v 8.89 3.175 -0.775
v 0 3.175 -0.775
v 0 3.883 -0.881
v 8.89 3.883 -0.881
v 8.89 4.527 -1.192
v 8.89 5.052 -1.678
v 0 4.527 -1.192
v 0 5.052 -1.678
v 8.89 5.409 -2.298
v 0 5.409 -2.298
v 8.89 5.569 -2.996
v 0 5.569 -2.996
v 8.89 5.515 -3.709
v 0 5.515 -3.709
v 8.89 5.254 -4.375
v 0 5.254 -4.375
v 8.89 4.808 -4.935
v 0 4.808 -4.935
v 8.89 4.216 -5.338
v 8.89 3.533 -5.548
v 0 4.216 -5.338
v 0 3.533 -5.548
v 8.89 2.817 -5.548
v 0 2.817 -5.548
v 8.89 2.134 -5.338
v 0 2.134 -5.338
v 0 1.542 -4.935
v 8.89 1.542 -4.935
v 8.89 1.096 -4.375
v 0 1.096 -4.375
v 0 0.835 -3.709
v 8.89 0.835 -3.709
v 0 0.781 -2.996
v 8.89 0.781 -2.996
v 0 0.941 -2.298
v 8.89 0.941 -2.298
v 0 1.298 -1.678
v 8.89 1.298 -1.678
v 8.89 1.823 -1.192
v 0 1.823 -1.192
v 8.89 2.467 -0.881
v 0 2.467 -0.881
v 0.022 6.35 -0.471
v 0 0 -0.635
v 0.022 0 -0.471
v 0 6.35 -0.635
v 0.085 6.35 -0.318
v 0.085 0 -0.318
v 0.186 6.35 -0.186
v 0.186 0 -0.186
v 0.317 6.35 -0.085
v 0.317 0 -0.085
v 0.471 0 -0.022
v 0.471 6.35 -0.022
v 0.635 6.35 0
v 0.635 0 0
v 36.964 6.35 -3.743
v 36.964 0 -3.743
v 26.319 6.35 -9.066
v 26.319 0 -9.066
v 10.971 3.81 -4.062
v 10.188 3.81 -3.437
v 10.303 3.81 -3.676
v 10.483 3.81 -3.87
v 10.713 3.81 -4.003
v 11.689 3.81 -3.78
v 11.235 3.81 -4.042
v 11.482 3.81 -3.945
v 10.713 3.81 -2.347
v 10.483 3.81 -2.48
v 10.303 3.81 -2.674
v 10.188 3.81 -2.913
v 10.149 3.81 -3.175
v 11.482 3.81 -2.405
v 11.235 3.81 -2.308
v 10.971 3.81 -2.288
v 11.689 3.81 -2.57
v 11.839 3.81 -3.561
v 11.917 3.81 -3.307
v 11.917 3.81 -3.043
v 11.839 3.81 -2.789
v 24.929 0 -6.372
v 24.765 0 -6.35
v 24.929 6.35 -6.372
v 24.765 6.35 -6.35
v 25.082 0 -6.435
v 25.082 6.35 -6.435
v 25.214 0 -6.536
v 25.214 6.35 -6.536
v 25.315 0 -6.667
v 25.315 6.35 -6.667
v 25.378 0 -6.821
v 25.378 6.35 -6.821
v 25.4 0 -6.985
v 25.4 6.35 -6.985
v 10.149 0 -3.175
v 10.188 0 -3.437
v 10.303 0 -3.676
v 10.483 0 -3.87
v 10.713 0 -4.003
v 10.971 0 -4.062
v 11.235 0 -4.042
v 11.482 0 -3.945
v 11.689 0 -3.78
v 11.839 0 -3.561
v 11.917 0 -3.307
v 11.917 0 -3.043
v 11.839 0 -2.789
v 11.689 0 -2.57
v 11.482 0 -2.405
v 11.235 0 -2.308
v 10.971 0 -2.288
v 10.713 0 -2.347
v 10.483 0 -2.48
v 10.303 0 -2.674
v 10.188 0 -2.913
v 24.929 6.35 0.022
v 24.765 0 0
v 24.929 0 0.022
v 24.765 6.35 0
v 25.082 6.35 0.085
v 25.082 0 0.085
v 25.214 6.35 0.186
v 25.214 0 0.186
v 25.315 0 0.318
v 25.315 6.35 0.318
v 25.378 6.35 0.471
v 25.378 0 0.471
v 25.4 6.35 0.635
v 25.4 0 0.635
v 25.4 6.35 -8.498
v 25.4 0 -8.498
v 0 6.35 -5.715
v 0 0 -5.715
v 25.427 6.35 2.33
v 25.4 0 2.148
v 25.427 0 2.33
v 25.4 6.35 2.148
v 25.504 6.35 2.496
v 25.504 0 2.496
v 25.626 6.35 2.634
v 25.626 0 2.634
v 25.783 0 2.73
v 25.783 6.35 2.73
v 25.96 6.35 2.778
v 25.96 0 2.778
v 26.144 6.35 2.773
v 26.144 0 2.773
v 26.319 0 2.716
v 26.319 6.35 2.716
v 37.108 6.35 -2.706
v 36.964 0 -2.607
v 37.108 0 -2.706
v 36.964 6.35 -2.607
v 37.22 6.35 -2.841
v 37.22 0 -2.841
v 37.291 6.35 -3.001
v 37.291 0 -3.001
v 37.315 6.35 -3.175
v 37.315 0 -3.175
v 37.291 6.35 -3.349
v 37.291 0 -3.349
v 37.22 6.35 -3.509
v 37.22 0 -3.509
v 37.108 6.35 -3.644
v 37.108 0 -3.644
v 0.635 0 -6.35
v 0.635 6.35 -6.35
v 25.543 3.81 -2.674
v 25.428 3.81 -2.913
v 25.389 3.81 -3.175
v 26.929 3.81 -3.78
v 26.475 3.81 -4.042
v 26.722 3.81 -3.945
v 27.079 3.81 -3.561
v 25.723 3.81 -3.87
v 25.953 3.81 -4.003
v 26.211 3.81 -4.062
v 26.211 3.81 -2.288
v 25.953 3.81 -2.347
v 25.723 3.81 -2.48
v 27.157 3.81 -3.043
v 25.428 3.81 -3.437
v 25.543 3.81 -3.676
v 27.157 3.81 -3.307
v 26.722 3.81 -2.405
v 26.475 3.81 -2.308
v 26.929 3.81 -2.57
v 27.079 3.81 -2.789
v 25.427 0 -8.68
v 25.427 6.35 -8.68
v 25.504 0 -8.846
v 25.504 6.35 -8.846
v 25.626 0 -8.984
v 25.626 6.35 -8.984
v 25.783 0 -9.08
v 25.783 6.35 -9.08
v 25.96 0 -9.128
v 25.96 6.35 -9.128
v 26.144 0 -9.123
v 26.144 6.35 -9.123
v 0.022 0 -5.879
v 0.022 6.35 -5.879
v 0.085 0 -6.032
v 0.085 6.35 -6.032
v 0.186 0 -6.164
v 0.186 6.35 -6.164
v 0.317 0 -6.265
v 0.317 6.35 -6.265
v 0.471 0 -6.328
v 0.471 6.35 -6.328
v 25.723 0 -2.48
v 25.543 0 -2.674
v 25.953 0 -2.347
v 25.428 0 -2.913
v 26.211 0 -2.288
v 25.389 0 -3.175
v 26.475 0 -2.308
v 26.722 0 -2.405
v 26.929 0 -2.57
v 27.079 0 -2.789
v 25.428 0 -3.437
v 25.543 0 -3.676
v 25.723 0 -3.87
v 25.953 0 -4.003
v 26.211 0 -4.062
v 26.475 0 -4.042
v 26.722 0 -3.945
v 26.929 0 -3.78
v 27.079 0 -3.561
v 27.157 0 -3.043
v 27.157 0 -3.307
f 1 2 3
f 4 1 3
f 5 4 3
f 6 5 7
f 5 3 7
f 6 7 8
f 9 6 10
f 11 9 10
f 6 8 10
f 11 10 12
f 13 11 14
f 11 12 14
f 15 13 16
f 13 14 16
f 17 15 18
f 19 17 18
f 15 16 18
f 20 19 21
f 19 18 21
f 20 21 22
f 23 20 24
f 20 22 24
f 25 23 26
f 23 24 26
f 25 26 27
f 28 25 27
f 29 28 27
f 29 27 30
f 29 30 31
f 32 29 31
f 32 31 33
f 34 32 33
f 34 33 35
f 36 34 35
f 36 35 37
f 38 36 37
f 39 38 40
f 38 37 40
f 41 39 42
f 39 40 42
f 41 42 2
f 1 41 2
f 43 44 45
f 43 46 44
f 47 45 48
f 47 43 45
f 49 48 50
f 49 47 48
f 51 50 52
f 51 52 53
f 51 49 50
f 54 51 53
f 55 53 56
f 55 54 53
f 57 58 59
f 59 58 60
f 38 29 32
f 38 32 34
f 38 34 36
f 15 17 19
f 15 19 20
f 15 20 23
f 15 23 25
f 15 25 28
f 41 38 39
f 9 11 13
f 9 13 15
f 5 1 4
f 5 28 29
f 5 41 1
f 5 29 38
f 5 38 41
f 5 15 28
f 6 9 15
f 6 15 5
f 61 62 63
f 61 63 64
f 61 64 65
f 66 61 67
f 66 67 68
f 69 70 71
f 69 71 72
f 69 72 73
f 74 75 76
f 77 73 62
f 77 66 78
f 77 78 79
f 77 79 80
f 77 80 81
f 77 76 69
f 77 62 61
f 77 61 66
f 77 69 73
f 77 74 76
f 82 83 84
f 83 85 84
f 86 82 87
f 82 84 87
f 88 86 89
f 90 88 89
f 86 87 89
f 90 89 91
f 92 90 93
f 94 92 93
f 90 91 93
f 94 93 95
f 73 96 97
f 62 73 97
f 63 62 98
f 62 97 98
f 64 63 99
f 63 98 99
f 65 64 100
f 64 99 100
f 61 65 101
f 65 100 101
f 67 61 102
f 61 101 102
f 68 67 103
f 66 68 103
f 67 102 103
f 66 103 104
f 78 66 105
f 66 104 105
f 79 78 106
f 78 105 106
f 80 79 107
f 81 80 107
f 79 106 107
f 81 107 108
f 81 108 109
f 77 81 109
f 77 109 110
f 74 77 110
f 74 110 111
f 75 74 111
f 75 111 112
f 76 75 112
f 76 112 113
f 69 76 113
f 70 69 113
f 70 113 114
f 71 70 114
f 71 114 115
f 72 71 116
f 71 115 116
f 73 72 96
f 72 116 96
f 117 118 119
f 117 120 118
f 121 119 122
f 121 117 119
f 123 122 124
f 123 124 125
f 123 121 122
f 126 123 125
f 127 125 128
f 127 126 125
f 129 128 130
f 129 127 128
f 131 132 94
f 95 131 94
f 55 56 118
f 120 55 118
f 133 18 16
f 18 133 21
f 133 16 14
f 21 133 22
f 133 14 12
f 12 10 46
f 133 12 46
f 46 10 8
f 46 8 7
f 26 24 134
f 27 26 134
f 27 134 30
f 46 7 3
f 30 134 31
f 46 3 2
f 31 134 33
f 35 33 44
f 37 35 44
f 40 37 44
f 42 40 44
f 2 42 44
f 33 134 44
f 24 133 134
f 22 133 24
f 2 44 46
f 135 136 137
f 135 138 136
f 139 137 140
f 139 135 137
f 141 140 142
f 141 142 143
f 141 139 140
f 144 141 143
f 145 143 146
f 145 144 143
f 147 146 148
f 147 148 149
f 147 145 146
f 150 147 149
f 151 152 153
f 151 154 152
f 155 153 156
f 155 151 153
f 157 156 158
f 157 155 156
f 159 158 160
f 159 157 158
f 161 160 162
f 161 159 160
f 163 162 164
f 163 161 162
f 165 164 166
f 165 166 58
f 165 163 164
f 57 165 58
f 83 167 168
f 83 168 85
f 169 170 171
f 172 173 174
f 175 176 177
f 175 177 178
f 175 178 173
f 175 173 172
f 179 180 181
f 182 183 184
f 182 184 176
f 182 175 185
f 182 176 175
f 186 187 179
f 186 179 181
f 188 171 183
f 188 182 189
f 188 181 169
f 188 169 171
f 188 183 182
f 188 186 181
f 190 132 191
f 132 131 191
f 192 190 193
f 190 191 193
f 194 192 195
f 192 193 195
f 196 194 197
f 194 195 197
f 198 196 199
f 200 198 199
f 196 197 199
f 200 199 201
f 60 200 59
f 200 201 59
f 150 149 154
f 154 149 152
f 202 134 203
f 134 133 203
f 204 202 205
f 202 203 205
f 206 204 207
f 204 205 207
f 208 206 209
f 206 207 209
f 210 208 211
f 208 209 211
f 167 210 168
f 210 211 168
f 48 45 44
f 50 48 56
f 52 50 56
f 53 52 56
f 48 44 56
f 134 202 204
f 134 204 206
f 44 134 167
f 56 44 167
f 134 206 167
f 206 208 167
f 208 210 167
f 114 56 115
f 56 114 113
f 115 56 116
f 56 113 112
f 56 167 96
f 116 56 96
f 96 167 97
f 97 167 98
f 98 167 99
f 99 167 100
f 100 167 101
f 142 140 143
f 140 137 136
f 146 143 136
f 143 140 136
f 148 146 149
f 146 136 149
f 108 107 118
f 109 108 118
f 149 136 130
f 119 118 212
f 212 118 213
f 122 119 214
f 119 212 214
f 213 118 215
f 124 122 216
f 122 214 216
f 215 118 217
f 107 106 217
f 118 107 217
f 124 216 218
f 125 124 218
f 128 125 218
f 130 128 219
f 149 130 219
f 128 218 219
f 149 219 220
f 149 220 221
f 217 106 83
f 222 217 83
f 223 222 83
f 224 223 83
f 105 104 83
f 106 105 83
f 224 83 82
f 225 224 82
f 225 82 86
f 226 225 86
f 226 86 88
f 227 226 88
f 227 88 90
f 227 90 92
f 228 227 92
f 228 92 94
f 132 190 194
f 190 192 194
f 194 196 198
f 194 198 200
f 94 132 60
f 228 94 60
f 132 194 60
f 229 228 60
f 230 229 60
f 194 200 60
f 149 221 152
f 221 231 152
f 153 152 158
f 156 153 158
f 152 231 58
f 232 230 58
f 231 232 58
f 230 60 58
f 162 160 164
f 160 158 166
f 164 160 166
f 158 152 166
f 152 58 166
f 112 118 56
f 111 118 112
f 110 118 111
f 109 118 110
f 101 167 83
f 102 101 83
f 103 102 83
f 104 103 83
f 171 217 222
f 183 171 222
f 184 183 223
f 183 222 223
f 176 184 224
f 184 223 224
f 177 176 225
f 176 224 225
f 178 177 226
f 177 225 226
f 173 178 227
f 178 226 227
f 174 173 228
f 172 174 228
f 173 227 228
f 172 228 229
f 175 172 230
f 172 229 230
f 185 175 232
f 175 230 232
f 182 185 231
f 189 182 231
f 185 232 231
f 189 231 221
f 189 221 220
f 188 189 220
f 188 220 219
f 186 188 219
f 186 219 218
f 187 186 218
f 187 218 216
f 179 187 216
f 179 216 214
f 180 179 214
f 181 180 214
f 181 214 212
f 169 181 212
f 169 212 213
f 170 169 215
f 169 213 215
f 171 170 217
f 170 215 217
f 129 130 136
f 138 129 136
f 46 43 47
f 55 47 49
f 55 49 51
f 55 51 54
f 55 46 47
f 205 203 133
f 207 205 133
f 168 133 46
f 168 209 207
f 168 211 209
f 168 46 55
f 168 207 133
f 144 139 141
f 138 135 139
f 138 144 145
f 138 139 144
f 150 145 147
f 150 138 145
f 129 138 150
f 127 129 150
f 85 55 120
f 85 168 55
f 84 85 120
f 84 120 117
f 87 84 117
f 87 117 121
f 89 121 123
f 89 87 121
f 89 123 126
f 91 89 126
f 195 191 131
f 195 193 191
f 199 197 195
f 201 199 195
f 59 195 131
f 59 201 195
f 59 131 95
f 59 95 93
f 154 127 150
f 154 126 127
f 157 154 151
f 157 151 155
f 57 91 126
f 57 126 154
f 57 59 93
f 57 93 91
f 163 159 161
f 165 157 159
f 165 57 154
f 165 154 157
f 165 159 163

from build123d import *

# Parameters (mm, degrees)
SKETCH1_W           = 25.4
SKETCH1_H           = 3.175
BOSS_EXTRUDE1_DEPTH = 6.35
SKETCH2_R           = 2.4003
CUT_EXTRUDE1_DEPTH  = 8.89
FILLET1_R           = 0.635
CUT_EXTRUDE2_DEPTH  = 3.81


with BuildPart() as part:
    # Sketch1 → Boss-Extrude1 (new body)
    with BuildSketch(Plane(origin=(0, 0, 0), x_dir=(1, 0, 0), z_dir=(0, 1, 0))):
        with Locations((12.7, 4.7625)):
            Rectangle(SKETCH1_W, SKETCH1_H)
        with Locations((12.7, 1.5875)):
            Rectangle(SKETCH1_W, SKETCH1_H)
        Polygon((25.4, 6.35), (25.4, 3.175), (38.1, 3.175), (25.4, 9.525), align=None)
        Polygon((38.1, 3.175), (25.4, 3.175), (25.4, 0), (25.4, -3.175), align=None)
    extrude(amount=BOSS_EXTRUDE1_DEPTH)

    # Sketch2 → Cut-Extrude1 (cut)
    with BuildSketch(Plane.ZY):
        with Locations((-3.175, 3.175)):
            Circle(SKETCH2_R)
    extrude(amount=-CUT_EXTRUDE1_DEPTH, mode=Mode.SUBTRACT)

    # Fillet1
    fillet1_edges = [part.edges().sort_by_distance(p)[0] for p in [
        (0, 3.175, -6.35),
        (25.4, 3.175, -6.35),
        (25.4, 3.175, -9.525),
        (38.1, 3.175, -3.175),
        (25.4, 3.175, 3.175),
        (25.4, 3.175, 0),
        (0, 3.175, 0),
    ]]
    fillet(fillet1_edges, radius=FILLET1_R)

    # Sketch3 → Cut-Extrude2 (cut)
    with BuildSketch(Plane.XZ):
        with BuildLine():
            ThreePointArc((11.926548417, -3.175), (11.037548417, -2.286), (10.148548417, -3.175))
            Line((10.148548417, -3.175), (11.926548417, -3.175))
        make_face()
        with BuildLine():
            Line((11.926548417, -3.175), (10.148548417, -3.175))
            ThreePointArc((10.148548417, -3.175), (11.037548417, -4.064), (11.926548417, -3.175))
        make_face()
        with BuildLine():
            ThreePointArc((27.166548417, -3.175), (26.277548417, -2.286), (25.388548417, -3.175))
            Line((25.388548417, -3.175), (27.166548417, -3.175))
        make_face()
        with BuildLine():
            Line((27.166548417, -3.175), (25.388548417, -3.175))
            ThreePointArc((25.388548417, -3.175), (26.277548417, -4.064), (27.166548417, -3.175))
        make_face()
    extrude(amount=-CUT_EXTRUDE2_DEPTH, mode=Mode.SUBTRACT)


solid = part.part
